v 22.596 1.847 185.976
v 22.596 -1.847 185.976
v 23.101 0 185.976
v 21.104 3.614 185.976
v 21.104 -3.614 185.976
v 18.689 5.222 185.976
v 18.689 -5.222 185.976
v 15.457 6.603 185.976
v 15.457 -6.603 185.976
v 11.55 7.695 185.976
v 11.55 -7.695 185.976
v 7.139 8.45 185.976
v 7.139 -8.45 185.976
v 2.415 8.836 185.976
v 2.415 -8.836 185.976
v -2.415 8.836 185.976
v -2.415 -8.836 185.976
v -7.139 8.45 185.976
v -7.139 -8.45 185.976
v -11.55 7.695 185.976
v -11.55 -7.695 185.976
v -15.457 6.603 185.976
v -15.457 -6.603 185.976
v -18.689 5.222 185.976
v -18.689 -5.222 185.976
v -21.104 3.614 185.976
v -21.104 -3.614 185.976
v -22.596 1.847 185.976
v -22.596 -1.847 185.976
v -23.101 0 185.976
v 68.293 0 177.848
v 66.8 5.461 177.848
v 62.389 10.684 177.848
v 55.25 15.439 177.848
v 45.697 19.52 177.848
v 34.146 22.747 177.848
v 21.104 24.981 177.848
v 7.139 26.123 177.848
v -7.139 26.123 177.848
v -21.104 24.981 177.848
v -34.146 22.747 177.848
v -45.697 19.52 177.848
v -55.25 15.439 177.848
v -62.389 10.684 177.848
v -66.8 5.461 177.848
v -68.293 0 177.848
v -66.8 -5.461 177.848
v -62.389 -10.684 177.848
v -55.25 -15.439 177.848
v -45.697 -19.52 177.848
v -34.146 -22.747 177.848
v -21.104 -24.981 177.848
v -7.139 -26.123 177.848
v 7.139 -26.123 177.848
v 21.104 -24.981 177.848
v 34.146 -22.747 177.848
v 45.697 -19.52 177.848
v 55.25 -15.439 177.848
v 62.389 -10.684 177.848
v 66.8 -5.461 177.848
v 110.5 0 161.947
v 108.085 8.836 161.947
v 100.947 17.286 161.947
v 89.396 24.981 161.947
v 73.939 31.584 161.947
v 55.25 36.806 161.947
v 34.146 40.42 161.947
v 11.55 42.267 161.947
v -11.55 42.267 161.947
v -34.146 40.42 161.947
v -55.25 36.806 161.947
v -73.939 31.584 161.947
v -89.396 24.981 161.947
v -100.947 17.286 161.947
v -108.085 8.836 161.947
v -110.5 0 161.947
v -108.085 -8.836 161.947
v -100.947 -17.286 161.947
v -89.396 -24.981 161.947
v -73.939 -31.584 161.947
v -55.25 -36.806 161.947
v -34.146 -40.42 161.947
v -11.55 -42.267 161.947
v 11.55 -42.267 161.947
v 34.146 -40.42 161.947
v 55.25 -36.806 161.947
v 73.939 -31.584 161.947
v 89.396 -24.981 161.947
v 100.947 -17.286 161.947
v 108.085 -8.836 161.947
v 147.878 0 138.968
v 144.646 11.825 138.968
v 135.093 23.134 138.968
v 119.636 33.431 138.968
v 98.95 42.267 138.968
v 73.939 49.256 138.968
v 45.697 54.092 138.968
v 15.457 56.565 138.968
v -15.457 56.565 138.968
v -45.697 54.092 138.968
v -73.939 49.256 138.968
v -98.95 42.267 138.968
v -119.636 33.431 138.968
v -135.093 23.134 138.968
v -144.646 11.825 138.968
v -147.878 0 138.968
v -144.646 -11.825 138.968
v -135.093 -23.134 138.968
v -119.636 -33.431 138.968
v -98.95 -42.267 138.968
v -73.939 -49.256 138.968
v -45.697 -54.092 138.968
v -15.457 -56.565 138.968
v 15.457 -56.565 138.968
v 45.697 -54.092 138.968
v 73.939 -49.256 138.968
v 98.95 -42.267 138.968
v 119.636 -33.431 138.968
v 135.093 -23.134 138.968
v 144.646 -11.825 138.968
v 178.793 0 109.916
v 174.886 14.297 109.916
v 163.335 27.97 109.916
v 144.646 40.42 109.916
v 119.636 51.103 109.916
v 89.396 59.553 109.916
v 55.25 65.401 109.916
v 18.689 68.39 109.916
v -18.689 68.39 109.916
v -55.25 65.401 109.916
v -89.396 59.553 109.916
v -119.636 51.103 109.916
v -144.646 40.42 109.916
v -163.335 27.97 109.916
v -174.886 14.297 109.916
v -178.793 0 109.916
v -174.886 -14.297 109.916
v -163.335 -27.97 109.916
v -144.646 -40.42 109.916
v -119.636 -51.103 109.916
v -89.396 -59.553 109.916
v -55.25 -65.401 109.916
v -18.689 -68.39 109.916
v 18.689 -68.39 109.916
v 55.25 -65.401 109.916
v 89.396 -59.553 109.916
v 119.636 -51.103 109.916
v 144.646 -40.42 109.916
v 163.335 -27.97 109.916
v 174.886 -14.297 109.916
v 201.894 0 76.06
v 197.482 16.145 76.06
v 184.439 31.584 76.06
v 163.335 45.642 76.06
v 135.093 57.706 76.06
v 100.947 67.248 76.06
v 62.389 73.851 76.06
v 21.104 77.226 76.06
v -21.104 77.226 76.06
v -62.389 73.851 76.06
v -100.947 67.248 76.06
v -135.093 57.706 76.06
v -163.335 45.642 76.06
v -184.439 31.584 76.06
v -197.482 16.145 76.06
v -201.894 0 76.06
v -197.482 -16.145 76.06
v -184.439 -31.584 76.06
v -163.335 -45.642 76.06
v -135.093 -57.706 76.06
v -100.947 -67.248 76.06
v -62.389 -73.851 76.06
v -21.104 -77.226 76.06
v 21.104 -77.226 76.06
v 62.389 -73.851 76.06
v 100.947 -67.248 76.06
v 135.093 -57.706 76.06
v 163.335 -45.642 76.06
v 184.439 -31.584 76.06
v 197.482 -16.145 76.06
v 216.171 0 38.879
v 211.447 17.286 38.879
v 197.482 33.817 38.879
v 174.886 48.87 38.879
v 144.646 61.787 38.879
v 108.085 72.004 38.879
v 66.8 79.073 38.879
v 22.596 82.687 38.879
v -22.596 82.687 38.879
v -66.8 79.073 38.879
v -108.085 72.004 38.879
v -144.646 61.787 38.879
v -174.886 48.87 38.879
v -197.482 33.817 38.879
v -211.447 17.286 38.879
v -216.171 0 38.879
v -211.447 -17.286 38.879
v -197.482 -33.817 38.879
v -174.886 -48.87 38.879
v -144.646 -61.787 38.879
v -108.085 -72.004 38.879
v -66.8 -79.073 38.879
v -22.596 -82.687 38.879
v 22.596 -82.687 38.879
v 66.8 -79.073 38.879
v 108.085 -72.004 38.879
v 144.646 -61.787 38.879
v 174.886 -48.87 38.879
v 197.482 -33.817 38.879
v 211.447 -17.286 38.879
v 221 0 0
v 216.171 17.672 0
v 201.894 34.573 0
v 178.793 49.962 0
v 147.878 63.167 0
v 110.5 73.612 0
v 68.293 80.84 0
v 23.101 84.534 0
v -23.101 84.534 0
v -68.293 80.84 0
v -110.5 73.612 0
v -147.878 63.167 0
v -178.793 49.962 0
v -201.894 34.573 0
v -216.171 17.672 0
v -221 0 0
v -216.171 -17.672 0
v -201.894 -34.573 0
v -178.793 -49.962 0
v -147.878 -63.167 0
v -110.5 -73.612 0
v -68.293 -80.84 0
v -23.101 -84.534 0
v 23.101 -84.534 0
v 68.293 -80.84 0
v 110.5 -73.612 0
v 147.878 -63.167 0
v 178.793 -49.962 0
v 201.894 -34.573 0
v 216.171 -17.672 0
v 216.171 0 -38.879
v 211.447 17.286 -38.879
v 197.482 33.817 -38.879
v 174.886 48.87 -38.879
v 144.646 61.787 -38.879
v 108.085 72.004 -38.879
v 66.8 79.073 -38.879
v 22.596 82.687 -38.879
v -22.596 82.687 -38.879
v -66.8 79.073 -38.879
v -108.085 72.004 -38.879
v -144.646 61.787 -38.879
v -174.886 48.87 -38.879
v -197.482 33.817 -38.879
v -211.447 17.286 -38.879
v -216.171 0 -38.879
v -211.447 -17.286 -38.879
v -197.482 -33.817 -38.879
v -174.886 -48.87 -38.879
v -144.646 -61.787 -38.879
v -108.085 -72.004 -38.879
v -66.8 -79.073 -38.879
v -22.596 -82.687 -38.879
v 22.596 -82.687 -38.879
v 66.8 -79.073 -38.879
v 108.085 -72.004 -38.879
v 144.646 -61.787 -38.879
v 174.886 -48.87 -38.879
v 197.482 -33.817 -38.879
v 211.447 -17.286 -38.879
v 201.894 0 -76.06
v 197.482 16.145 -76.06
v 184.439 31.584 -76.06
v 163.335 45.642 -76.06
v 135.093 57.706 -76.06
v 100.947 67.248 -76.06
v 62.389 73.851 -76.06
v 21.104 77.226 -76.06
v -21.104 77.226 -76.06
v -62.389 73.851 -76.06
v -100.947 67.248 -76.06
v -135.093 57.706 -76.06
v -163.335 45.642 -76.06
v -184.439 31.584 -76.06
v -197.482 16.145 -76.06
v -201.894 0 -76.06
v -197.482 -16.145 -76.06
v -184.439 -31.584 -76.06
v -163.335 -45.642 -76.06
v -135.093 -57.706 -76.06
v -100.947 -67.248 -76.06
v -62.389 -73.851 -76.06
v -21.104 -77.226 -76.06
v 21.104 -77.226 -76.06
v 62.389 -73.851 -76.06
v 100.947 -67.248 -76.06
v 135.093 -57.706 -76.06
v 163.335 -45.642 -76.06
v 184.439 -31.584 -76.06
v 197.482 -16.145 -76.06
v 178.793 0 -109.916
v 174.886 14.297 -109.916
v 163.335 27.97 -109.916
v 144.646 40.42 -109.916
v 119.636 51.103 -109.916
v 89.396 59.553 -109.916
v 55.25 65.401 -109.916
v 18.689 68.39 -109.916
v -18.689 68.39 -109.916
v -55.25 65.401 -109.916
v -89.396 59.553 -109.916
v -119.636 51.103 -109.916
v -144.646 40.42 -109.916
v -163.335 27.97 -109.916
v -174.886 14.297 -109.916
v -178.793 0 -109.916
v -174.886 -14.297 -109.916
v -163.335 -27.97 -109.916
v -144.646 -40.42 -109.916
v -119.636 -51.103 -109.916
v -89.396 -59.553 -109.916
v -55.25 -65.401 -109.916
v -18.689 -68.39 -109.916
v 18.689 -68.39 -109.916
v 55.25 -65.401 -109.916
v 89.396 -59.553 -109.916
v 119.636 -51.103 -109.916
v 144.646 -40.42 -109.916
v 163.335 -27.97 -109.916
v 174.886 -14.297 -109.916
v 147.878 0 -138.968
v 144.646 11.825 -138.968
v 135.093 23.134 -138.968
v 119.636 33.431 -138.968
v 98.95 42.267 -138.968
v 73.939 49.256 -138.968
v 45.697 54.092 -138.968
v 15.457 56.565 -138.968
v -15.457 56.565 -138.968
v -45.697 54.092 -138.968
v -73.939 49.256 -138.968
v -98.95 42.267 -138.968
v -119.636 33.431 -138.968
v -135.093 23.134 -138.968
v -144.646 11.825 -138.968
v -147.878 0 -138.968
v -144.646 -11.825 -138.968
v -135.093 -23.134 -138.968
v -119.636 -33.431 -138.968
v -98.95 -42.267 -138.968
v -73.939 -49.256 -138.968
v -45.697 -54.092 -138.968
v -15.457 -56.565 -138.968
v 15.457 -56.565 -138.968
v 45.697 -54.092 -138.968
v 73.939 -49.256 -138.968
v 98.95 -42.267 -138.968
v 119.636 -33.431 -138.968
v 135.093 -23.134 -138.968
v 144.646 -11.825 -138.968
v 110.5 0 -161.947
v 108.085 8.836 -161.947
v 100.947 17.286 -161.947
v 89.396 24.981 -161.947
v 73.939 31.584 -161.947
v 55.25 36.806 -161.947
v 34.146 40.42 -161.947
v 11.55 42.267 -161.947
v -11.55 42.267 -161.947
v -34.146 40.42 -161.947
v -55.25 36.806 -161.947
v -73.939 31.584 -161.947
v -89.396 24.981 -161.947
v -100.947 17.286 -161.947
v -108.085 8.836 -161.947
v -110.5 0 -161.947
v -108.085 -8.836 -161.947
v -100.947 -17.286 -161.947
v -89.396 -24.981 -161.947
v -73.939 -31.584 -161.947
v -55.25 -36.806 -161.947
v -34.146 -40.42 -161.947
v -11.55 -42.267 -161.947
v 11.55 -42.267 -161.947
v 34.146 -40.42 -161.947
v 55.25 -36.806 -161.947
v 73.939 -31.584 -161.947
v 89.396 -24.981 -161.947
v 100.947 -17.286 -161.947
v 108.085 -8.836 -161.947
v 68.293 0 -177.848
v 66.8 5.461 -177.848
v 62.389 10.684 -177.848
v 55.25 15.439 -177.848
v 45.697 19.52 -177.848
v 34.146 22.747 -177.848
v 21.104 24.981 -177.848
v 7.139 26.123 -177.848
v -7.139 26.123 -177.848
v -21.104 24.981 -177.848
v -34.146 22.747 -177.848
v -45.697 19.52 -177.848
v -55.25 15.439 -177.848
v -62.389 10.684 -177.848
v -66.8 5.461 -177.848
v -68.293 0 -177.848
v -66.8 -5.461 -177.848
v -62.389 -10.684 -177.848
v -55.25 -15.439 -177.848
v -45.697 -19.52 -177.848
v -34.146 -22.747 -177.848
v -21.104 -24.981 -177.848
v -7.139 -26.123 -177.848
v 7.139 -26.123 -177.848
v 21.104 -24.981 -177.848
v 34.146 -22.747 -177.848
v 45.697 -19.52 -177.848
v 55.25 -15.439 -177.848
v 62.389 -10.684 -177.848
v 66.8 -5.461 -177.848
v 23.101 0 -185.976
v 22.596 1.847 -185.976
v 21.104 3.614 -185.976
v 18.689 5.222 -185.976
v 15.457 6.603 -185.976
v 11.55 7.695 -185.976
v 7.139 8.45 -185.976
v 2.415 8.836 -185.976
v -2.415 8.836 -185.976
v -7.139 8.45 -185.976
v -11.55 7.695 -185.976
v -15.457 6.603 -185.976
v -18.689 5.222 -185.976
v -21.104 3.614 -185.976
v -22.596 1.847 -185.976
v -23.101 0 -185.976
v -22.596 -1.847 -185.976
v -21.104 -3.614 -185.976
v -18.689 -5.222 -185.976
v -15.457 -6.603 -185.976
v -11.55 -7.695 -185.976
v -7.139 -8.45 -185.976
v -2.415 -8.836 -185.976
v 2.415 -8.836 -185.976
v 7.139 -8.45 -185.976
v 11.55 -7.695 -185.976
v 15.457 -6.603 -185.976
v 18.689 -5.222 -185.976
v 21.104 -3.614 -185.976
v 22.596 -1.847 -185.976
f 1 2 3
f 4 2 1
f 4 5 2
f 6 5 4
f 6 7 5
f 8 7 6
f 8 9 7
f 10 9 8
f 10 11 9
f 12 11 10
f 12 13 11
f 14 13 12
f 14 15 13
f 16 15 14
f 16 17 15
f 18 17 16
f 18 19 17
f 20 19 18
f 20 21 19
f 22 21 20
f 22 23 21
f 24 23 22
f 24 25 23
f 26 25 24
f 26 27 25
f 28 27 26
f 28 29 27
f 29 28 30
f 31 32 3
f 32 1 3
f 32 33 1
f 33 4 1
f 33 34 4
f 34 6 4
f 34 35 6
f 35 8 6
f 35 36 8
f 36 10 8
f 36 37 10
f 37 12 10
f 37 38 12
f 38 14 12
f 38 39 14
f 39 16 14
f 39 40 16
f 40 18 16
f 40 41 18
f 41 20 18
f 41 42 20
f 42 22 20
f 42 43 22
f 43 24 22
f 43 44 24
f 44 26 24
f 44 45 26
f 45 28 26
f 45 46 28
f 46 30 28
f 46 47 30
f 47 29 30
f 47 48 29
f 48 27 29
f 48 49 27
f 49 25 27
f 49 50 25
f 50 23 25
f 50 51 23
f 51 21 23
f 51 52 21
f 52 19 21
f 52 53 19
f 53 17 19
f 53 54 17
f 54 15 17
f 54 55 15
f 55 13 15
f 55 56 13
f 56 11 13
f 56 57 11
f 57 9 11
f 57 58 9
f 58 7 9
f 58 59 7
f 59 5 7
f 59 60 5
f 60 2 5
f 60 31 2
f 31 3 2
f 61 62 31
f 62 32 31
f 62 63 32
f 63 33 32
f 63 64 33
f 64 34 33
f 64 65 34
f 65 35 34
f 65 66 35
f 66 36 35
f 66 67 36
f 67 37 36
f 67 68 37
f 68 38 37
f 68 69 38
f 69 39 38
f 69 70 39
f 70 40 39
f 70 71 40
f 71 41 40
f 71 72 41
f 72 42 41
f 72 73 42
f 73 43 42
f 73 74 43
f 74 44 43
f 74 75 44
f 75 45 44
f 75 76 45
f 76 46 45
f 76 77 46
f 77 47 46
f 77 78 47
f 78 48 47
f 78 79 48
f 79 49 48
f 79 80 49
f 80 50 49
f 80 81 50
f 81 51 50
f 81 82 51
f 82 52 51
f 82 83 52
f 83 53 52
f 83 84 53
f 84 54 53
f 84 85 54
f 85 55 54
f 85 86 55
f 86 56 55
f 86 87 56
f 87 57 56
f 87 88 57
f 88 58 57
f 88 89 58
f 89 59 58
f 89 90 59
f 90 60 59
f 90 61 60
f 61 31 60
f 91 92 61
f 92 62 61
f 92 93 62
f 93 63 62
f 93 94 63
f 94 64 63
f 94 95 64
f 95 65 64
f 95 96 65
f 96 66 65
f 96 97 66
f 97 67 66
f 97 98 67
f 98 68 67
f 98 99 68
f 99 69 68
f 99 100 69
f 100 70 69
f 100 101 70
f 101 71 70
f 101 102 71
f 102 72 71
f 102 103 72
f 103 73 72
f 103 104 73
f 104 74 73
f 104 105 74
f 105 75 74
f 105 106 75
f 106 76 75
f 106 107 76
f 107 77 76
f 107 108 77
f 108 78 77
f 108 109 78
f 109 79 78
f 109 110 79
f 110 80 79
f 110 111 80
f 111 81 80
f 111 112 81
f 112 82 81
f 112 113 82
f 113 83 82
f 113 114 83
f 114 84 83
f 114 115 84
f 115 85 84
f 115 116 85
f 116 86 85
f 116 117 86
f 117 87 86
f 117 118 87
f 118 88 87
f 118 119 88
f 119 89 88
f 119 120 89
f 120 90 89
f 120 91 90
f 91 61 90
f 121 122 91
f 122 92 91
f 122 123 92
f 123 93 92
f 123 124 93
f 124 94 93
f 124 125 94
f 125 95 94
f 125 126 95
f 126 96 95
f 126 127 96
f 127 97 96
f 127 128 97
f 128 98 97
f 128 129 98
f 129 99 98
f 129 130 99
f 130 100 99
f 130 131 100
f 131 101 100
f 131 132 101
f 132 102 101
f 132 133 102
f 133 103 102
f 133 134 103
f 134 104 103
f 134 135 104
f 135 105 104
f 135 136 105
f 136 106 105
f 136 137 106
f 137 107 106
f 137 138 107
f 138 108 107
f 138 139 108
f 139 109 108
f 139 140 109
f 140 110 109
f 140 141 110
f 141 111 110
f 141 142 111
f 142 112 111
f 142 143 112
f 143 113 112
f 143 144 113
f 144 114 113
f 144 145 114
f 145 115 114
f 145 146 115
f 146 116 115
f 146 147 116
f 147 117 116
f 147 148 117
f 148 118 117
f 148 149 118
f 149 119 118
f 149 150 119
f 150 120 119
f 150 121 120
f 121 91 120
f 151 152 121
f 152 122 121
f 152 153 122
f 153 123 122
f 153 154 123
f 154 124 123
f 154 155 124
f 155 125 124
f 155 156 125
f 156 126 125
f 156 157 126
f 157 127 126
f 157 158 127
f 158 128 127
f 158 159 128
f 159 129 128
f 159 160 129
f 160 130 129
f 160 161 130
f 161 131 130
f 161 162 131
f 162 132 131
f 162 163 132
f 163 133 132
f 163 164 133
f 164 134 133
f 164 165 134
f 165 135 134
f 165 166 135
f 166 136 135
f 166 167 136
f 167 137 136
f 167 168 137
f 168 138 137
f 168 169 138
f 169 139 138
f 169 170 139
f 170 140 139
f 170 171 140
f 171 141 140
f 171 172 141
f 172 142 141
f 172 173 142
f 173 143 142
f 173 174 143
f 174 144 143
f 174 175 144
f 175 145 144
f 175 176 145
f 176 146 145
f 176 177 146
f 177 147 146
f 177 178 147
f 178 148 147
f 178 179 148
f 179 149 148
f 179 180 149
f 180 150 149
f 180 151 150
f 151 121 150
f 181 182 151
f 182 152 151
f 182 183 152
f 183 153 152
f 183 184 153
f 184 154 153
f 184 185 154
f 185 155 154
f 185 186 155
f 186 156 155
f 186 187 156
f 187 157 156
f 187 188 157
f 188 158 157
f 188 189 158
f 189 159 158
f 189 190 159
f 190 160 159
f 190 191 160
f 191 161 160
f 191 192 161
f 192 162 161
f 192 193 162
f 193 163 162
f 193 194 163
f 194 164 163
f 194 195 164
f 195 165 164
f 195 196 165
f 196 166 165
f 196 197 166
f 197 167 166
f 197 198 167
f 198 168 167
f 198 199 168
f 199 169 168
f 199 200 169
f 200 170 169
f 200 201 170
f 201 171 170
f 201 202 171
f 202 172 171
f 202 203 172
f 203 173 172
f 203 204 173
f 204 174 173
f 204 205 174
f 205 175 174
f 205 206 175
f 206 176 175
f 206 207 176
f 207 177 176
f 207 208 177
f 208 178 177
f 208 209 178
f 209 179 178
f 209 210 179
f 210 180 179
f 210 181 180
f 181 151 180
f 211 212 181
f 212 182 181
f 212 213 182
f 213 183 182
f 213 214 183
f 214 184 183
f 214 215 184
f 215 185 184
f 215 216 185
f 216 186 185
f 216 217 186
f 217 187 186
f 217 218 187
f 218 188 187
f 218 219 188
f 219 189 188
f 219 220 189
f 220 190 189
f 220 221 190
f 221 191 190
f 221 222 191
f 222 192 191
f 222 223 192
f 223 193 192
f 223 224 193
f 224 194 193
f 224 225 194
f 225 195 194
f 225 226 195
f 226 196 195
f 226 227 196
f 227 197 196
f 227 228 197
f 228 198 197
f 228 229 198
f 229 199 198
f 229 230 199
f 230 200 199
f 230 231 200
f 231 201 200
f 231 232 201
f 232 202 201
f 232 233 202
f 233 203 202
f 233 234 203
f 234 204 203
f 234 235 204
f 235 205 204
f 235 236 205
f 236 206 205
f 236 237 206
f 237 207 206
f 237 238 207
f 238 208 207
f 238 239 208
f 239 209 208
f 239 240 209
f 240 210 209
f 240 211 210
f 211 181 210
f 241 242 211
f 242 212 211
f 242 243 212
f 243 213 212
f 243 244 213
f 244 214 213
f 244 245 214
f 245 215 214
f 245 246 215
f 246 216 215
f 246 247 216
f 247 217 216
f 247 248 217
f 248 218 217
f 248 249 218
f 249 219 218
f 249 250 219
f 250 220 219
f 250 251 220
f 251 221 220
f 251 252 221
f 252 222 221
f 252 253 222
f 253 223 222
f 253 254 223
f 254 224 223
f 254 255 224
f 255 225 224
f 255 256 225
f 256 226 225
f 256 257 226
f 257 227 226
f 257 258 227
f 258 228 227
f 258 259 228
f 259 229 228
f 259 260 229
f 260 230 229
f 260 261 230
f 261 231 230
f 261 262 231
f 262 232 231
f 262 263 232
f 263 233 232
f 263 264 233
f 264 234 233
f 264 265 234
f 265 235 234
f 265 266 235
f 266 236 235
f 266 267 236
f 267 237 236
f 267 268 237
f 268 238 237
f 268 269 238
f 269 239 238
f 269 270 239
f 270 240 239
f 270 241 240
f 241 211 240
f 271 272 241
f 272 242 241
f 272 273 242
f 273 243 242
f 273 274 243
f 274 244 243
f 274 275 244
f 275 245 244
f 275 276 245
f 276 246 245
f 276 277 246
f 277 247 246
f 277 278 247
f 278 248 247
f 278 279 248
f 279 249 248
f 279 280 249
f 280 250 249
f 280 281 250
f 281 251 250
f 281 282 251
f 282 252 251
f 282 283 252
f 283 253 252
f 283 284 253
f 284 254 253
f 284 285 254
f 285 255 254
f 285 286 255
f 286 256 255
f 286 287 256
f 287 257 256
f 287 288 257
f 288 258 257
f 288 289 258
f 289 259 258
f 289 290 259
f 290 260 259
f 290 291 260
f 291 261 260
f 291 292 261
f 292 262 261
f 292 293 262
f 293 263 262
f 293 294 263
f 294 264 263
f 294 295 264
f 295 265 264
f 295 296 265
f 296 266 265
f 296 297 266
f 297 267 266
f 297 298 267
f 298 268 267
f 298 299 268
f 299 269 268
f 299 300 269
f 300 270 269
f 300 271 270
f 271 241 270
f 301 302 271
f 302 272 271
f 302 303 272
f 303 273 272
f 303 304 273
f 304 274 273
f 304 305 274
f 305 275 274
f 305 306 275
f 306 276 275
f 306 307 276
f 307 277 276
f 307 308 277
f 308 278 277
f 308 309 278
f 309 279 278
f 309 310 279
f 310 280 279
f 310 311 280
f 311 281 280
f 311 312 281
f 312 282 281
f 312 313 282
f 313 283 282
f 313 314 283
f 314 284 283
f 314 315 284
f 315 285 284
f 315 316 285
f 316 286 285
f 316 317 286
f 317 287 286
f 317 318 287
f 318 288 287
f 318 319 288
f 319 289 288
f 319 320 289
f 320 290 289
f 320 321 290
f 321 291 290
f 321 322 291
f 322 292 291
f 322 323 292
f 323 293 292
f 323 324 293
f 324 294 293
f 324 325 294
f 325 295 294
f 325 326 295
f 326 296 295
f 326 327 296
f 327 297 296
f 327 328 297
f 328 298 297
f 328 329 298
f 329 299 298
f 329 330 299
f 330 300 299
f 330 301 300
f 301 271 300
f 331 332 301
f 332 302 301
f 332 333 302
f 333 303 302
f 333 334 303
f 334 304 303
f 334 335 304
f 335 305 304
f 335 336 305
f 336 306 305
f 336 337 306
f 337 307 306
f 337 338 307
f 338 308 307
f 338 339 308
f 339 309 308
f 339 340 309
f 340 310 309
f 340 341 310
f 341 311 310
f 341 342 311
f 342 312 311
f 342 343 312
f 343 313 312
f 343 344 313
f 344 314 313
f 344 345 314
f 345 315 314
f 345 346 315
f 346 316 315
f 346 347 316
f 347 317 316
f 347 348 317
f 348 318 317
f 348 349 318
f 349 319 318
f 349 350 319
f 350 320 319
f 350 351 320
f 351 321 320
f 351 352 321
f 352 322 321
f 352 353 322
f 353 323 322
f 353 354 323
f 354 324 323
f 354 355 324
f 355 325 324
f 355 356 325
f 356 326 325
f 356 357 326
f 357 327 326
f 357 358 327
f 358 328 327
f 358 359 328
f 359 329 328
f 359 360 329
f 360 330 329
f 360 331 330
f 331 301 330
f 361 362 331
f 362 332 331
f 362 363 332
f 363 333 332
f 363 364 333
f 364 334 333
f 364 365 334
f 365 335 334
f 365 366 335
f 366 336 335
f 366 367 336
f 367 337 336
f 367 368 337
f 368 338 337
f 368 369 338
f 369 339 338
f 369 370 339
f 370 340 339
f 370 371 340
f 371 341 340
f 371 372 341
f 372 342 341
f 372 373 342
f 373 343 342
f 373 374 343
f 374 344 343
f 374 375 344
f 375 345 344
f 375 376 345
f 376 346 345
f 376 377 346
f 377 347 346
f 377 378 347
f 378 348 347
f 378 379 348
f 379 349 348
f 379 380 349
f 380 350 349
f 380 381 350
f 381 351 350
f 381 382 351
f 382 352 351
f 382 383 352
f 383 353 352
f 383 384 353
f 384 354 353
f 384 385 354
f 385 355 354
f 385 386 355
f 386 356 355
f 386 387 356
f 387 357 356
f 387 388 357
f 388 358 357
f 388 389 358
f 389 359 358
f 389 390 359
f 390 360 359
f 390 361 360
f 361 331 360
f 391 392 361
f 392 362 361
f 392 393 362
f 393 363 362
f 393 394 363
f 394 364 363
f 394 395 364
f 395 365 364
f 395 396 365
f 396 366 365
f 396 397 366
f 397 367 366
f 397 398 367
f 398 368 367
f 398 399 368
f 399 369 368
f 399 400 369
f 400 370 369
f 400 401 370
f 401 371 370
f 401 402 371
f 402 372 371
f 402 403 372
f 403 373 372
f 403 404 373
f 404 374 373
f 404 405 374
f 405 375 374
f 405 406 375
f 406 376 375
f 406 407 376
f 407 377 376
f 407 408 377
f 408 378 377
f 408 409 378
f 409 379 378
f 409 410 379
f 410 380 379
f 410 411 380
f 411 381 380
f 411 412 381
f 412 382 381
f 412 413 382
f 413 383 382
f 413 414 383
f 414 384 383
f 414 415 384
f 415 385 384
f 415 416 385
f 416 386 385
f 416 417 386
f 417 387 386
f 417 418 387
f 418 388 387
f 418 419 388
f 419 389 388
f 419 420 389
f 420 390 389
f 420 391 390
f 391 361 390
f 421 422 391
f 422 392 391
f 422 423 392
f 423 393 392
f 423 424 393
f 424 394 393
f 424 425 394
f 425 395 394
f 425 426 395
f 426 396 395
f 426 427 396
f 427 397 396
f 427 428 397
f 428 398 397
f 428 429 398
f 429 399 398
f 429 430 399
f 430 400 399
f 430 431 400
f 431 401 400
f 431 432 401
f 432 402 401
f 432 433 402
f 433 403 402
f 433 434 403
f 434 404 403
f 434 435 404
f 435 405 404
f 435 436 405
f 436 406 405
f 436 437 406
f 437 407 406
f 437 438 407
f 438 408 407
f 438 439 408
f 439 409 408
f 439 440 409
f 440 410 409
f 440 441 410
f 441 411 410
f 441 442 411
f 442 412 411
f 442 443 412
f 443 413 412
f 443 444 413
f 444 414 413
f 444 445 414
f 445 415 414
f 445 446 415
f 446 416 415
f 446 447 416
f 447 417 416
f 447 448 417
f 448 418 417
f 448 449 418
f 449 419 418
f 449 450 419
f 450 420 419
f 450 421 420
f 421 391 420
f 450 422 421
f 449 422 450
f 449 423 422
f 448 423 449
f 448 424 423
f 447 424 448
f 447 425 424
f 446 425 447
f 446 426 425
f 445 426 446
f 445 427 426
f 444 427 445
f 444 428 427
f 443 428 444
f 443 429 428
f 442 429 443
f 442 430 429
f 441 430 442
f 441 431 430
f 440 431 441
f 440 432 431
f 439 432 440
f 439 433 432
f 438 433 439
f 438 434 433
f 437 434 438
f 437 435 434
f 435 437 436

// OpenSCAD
// Generated by SolidPython 1.0.1 on 2020-07-29 00:46:50


scale(v = [13, 5, 11]) {
	sphere(r = 17);
}
/***********************************************
*********      SolidPython code:      **********
************************************************
 
# import packages: SolidPython
from solid import *
from solid.utils import *
from itertools import chain, combinations, permutations


class Resize:

    def __init__(self, scad_file):
        self.scad_file = scad_file
        #self.scad_file = import_scad(scad_file)
        # cone/cylinder param:
        self.r1 = 0
        self.r2 = 0
        self.h = 0
        # rectangular prism param:
        self.w = 0
        self.l = 0
        # ellipse param:
        self.r = 0

    # import OpenScad code (file name corresponds to shape)


    # classify shape + parameters
    def assign(self, param1, param2, param3):
        if self.scad_file == 'cone.scad':
            self.r1 = param1
            self.r2 = param2
            self.h = param3
        elif self.scad_file == 'cylinder.scad':
            self.r1 = param1
            self.r2 = param2
            self.h = param3
        elif self.scad_file == 'rectangularPrism.scad':
            self.h = param1
            self.l = param2
            self.w = param3
        else:
            self.r = param1
            self.h = param2

    # resize parameters
    def iterate(self):
        x = range(3, 20, 2)
        i = 1
        if self.scad_file == 'cone.scad':
            tempList = list(permutations(x, 2))
            for temp in tempList:
                param1 = temp[0]
                param2 = temp[1]
                filepath = 'produced_scad_files/' + 'cone' + str(param1) + '_' + str(param2) + '_' + '.scad'
                scad_render_to_file(cylinder(h=param1, r1=param2, r2=0), filepath)

        elif self.scad_file == 'cylinder.scad':
            tempList = list(permutations(x, 3))
            for temp in tempList:
                param1 = temp[0]
                param2 = temp[1]
                filepath = 'produced_scad_files/' + 'cylinder' + str(param1) + '_' + str(param2) + '_' + '.scad'
                scad_render_to_file(cylinder(h=param1, r1=param2, r2=param2), filepath)

        elif self.scad_file == 'rectangularPrism.scad':
            tempList = list(permutations(x, 3))
            for temp in tempList:
                param1 = temp[0]
                param2 = temp[1]
                param3 = temp[2]
                filepath = 'produced_scad_files/' + 'rectangularPrism' + str(param1) + '_' + str(param2) + '_' + str(
                    param3) + '.scad'
                scad_render_to_file(cube(size=(param1, param2, param3)), filepath)

        elif self.scad_file == 'ellipse.scad':
            tempList = list(permutations(x, 4))
            for temp in tempList:
                param1 = temp[0]
                param2 = temp[1]
                param3 = temp[2]
                param4 = temp[3]
                filepath = 'produced_scad_files/' + 'ellipse' + str(param1) + '_' + str(param2) + '_' + str(param3) + '_' + str(param4) + '.scad'
                scad_render_to_file(scale([param1, param2, param3])(sphere(r=param4)), filepath)

    def render_to_scadfile(self):
        scad_render_to_file(scad, 'example.scad') 
 
************************************************/
